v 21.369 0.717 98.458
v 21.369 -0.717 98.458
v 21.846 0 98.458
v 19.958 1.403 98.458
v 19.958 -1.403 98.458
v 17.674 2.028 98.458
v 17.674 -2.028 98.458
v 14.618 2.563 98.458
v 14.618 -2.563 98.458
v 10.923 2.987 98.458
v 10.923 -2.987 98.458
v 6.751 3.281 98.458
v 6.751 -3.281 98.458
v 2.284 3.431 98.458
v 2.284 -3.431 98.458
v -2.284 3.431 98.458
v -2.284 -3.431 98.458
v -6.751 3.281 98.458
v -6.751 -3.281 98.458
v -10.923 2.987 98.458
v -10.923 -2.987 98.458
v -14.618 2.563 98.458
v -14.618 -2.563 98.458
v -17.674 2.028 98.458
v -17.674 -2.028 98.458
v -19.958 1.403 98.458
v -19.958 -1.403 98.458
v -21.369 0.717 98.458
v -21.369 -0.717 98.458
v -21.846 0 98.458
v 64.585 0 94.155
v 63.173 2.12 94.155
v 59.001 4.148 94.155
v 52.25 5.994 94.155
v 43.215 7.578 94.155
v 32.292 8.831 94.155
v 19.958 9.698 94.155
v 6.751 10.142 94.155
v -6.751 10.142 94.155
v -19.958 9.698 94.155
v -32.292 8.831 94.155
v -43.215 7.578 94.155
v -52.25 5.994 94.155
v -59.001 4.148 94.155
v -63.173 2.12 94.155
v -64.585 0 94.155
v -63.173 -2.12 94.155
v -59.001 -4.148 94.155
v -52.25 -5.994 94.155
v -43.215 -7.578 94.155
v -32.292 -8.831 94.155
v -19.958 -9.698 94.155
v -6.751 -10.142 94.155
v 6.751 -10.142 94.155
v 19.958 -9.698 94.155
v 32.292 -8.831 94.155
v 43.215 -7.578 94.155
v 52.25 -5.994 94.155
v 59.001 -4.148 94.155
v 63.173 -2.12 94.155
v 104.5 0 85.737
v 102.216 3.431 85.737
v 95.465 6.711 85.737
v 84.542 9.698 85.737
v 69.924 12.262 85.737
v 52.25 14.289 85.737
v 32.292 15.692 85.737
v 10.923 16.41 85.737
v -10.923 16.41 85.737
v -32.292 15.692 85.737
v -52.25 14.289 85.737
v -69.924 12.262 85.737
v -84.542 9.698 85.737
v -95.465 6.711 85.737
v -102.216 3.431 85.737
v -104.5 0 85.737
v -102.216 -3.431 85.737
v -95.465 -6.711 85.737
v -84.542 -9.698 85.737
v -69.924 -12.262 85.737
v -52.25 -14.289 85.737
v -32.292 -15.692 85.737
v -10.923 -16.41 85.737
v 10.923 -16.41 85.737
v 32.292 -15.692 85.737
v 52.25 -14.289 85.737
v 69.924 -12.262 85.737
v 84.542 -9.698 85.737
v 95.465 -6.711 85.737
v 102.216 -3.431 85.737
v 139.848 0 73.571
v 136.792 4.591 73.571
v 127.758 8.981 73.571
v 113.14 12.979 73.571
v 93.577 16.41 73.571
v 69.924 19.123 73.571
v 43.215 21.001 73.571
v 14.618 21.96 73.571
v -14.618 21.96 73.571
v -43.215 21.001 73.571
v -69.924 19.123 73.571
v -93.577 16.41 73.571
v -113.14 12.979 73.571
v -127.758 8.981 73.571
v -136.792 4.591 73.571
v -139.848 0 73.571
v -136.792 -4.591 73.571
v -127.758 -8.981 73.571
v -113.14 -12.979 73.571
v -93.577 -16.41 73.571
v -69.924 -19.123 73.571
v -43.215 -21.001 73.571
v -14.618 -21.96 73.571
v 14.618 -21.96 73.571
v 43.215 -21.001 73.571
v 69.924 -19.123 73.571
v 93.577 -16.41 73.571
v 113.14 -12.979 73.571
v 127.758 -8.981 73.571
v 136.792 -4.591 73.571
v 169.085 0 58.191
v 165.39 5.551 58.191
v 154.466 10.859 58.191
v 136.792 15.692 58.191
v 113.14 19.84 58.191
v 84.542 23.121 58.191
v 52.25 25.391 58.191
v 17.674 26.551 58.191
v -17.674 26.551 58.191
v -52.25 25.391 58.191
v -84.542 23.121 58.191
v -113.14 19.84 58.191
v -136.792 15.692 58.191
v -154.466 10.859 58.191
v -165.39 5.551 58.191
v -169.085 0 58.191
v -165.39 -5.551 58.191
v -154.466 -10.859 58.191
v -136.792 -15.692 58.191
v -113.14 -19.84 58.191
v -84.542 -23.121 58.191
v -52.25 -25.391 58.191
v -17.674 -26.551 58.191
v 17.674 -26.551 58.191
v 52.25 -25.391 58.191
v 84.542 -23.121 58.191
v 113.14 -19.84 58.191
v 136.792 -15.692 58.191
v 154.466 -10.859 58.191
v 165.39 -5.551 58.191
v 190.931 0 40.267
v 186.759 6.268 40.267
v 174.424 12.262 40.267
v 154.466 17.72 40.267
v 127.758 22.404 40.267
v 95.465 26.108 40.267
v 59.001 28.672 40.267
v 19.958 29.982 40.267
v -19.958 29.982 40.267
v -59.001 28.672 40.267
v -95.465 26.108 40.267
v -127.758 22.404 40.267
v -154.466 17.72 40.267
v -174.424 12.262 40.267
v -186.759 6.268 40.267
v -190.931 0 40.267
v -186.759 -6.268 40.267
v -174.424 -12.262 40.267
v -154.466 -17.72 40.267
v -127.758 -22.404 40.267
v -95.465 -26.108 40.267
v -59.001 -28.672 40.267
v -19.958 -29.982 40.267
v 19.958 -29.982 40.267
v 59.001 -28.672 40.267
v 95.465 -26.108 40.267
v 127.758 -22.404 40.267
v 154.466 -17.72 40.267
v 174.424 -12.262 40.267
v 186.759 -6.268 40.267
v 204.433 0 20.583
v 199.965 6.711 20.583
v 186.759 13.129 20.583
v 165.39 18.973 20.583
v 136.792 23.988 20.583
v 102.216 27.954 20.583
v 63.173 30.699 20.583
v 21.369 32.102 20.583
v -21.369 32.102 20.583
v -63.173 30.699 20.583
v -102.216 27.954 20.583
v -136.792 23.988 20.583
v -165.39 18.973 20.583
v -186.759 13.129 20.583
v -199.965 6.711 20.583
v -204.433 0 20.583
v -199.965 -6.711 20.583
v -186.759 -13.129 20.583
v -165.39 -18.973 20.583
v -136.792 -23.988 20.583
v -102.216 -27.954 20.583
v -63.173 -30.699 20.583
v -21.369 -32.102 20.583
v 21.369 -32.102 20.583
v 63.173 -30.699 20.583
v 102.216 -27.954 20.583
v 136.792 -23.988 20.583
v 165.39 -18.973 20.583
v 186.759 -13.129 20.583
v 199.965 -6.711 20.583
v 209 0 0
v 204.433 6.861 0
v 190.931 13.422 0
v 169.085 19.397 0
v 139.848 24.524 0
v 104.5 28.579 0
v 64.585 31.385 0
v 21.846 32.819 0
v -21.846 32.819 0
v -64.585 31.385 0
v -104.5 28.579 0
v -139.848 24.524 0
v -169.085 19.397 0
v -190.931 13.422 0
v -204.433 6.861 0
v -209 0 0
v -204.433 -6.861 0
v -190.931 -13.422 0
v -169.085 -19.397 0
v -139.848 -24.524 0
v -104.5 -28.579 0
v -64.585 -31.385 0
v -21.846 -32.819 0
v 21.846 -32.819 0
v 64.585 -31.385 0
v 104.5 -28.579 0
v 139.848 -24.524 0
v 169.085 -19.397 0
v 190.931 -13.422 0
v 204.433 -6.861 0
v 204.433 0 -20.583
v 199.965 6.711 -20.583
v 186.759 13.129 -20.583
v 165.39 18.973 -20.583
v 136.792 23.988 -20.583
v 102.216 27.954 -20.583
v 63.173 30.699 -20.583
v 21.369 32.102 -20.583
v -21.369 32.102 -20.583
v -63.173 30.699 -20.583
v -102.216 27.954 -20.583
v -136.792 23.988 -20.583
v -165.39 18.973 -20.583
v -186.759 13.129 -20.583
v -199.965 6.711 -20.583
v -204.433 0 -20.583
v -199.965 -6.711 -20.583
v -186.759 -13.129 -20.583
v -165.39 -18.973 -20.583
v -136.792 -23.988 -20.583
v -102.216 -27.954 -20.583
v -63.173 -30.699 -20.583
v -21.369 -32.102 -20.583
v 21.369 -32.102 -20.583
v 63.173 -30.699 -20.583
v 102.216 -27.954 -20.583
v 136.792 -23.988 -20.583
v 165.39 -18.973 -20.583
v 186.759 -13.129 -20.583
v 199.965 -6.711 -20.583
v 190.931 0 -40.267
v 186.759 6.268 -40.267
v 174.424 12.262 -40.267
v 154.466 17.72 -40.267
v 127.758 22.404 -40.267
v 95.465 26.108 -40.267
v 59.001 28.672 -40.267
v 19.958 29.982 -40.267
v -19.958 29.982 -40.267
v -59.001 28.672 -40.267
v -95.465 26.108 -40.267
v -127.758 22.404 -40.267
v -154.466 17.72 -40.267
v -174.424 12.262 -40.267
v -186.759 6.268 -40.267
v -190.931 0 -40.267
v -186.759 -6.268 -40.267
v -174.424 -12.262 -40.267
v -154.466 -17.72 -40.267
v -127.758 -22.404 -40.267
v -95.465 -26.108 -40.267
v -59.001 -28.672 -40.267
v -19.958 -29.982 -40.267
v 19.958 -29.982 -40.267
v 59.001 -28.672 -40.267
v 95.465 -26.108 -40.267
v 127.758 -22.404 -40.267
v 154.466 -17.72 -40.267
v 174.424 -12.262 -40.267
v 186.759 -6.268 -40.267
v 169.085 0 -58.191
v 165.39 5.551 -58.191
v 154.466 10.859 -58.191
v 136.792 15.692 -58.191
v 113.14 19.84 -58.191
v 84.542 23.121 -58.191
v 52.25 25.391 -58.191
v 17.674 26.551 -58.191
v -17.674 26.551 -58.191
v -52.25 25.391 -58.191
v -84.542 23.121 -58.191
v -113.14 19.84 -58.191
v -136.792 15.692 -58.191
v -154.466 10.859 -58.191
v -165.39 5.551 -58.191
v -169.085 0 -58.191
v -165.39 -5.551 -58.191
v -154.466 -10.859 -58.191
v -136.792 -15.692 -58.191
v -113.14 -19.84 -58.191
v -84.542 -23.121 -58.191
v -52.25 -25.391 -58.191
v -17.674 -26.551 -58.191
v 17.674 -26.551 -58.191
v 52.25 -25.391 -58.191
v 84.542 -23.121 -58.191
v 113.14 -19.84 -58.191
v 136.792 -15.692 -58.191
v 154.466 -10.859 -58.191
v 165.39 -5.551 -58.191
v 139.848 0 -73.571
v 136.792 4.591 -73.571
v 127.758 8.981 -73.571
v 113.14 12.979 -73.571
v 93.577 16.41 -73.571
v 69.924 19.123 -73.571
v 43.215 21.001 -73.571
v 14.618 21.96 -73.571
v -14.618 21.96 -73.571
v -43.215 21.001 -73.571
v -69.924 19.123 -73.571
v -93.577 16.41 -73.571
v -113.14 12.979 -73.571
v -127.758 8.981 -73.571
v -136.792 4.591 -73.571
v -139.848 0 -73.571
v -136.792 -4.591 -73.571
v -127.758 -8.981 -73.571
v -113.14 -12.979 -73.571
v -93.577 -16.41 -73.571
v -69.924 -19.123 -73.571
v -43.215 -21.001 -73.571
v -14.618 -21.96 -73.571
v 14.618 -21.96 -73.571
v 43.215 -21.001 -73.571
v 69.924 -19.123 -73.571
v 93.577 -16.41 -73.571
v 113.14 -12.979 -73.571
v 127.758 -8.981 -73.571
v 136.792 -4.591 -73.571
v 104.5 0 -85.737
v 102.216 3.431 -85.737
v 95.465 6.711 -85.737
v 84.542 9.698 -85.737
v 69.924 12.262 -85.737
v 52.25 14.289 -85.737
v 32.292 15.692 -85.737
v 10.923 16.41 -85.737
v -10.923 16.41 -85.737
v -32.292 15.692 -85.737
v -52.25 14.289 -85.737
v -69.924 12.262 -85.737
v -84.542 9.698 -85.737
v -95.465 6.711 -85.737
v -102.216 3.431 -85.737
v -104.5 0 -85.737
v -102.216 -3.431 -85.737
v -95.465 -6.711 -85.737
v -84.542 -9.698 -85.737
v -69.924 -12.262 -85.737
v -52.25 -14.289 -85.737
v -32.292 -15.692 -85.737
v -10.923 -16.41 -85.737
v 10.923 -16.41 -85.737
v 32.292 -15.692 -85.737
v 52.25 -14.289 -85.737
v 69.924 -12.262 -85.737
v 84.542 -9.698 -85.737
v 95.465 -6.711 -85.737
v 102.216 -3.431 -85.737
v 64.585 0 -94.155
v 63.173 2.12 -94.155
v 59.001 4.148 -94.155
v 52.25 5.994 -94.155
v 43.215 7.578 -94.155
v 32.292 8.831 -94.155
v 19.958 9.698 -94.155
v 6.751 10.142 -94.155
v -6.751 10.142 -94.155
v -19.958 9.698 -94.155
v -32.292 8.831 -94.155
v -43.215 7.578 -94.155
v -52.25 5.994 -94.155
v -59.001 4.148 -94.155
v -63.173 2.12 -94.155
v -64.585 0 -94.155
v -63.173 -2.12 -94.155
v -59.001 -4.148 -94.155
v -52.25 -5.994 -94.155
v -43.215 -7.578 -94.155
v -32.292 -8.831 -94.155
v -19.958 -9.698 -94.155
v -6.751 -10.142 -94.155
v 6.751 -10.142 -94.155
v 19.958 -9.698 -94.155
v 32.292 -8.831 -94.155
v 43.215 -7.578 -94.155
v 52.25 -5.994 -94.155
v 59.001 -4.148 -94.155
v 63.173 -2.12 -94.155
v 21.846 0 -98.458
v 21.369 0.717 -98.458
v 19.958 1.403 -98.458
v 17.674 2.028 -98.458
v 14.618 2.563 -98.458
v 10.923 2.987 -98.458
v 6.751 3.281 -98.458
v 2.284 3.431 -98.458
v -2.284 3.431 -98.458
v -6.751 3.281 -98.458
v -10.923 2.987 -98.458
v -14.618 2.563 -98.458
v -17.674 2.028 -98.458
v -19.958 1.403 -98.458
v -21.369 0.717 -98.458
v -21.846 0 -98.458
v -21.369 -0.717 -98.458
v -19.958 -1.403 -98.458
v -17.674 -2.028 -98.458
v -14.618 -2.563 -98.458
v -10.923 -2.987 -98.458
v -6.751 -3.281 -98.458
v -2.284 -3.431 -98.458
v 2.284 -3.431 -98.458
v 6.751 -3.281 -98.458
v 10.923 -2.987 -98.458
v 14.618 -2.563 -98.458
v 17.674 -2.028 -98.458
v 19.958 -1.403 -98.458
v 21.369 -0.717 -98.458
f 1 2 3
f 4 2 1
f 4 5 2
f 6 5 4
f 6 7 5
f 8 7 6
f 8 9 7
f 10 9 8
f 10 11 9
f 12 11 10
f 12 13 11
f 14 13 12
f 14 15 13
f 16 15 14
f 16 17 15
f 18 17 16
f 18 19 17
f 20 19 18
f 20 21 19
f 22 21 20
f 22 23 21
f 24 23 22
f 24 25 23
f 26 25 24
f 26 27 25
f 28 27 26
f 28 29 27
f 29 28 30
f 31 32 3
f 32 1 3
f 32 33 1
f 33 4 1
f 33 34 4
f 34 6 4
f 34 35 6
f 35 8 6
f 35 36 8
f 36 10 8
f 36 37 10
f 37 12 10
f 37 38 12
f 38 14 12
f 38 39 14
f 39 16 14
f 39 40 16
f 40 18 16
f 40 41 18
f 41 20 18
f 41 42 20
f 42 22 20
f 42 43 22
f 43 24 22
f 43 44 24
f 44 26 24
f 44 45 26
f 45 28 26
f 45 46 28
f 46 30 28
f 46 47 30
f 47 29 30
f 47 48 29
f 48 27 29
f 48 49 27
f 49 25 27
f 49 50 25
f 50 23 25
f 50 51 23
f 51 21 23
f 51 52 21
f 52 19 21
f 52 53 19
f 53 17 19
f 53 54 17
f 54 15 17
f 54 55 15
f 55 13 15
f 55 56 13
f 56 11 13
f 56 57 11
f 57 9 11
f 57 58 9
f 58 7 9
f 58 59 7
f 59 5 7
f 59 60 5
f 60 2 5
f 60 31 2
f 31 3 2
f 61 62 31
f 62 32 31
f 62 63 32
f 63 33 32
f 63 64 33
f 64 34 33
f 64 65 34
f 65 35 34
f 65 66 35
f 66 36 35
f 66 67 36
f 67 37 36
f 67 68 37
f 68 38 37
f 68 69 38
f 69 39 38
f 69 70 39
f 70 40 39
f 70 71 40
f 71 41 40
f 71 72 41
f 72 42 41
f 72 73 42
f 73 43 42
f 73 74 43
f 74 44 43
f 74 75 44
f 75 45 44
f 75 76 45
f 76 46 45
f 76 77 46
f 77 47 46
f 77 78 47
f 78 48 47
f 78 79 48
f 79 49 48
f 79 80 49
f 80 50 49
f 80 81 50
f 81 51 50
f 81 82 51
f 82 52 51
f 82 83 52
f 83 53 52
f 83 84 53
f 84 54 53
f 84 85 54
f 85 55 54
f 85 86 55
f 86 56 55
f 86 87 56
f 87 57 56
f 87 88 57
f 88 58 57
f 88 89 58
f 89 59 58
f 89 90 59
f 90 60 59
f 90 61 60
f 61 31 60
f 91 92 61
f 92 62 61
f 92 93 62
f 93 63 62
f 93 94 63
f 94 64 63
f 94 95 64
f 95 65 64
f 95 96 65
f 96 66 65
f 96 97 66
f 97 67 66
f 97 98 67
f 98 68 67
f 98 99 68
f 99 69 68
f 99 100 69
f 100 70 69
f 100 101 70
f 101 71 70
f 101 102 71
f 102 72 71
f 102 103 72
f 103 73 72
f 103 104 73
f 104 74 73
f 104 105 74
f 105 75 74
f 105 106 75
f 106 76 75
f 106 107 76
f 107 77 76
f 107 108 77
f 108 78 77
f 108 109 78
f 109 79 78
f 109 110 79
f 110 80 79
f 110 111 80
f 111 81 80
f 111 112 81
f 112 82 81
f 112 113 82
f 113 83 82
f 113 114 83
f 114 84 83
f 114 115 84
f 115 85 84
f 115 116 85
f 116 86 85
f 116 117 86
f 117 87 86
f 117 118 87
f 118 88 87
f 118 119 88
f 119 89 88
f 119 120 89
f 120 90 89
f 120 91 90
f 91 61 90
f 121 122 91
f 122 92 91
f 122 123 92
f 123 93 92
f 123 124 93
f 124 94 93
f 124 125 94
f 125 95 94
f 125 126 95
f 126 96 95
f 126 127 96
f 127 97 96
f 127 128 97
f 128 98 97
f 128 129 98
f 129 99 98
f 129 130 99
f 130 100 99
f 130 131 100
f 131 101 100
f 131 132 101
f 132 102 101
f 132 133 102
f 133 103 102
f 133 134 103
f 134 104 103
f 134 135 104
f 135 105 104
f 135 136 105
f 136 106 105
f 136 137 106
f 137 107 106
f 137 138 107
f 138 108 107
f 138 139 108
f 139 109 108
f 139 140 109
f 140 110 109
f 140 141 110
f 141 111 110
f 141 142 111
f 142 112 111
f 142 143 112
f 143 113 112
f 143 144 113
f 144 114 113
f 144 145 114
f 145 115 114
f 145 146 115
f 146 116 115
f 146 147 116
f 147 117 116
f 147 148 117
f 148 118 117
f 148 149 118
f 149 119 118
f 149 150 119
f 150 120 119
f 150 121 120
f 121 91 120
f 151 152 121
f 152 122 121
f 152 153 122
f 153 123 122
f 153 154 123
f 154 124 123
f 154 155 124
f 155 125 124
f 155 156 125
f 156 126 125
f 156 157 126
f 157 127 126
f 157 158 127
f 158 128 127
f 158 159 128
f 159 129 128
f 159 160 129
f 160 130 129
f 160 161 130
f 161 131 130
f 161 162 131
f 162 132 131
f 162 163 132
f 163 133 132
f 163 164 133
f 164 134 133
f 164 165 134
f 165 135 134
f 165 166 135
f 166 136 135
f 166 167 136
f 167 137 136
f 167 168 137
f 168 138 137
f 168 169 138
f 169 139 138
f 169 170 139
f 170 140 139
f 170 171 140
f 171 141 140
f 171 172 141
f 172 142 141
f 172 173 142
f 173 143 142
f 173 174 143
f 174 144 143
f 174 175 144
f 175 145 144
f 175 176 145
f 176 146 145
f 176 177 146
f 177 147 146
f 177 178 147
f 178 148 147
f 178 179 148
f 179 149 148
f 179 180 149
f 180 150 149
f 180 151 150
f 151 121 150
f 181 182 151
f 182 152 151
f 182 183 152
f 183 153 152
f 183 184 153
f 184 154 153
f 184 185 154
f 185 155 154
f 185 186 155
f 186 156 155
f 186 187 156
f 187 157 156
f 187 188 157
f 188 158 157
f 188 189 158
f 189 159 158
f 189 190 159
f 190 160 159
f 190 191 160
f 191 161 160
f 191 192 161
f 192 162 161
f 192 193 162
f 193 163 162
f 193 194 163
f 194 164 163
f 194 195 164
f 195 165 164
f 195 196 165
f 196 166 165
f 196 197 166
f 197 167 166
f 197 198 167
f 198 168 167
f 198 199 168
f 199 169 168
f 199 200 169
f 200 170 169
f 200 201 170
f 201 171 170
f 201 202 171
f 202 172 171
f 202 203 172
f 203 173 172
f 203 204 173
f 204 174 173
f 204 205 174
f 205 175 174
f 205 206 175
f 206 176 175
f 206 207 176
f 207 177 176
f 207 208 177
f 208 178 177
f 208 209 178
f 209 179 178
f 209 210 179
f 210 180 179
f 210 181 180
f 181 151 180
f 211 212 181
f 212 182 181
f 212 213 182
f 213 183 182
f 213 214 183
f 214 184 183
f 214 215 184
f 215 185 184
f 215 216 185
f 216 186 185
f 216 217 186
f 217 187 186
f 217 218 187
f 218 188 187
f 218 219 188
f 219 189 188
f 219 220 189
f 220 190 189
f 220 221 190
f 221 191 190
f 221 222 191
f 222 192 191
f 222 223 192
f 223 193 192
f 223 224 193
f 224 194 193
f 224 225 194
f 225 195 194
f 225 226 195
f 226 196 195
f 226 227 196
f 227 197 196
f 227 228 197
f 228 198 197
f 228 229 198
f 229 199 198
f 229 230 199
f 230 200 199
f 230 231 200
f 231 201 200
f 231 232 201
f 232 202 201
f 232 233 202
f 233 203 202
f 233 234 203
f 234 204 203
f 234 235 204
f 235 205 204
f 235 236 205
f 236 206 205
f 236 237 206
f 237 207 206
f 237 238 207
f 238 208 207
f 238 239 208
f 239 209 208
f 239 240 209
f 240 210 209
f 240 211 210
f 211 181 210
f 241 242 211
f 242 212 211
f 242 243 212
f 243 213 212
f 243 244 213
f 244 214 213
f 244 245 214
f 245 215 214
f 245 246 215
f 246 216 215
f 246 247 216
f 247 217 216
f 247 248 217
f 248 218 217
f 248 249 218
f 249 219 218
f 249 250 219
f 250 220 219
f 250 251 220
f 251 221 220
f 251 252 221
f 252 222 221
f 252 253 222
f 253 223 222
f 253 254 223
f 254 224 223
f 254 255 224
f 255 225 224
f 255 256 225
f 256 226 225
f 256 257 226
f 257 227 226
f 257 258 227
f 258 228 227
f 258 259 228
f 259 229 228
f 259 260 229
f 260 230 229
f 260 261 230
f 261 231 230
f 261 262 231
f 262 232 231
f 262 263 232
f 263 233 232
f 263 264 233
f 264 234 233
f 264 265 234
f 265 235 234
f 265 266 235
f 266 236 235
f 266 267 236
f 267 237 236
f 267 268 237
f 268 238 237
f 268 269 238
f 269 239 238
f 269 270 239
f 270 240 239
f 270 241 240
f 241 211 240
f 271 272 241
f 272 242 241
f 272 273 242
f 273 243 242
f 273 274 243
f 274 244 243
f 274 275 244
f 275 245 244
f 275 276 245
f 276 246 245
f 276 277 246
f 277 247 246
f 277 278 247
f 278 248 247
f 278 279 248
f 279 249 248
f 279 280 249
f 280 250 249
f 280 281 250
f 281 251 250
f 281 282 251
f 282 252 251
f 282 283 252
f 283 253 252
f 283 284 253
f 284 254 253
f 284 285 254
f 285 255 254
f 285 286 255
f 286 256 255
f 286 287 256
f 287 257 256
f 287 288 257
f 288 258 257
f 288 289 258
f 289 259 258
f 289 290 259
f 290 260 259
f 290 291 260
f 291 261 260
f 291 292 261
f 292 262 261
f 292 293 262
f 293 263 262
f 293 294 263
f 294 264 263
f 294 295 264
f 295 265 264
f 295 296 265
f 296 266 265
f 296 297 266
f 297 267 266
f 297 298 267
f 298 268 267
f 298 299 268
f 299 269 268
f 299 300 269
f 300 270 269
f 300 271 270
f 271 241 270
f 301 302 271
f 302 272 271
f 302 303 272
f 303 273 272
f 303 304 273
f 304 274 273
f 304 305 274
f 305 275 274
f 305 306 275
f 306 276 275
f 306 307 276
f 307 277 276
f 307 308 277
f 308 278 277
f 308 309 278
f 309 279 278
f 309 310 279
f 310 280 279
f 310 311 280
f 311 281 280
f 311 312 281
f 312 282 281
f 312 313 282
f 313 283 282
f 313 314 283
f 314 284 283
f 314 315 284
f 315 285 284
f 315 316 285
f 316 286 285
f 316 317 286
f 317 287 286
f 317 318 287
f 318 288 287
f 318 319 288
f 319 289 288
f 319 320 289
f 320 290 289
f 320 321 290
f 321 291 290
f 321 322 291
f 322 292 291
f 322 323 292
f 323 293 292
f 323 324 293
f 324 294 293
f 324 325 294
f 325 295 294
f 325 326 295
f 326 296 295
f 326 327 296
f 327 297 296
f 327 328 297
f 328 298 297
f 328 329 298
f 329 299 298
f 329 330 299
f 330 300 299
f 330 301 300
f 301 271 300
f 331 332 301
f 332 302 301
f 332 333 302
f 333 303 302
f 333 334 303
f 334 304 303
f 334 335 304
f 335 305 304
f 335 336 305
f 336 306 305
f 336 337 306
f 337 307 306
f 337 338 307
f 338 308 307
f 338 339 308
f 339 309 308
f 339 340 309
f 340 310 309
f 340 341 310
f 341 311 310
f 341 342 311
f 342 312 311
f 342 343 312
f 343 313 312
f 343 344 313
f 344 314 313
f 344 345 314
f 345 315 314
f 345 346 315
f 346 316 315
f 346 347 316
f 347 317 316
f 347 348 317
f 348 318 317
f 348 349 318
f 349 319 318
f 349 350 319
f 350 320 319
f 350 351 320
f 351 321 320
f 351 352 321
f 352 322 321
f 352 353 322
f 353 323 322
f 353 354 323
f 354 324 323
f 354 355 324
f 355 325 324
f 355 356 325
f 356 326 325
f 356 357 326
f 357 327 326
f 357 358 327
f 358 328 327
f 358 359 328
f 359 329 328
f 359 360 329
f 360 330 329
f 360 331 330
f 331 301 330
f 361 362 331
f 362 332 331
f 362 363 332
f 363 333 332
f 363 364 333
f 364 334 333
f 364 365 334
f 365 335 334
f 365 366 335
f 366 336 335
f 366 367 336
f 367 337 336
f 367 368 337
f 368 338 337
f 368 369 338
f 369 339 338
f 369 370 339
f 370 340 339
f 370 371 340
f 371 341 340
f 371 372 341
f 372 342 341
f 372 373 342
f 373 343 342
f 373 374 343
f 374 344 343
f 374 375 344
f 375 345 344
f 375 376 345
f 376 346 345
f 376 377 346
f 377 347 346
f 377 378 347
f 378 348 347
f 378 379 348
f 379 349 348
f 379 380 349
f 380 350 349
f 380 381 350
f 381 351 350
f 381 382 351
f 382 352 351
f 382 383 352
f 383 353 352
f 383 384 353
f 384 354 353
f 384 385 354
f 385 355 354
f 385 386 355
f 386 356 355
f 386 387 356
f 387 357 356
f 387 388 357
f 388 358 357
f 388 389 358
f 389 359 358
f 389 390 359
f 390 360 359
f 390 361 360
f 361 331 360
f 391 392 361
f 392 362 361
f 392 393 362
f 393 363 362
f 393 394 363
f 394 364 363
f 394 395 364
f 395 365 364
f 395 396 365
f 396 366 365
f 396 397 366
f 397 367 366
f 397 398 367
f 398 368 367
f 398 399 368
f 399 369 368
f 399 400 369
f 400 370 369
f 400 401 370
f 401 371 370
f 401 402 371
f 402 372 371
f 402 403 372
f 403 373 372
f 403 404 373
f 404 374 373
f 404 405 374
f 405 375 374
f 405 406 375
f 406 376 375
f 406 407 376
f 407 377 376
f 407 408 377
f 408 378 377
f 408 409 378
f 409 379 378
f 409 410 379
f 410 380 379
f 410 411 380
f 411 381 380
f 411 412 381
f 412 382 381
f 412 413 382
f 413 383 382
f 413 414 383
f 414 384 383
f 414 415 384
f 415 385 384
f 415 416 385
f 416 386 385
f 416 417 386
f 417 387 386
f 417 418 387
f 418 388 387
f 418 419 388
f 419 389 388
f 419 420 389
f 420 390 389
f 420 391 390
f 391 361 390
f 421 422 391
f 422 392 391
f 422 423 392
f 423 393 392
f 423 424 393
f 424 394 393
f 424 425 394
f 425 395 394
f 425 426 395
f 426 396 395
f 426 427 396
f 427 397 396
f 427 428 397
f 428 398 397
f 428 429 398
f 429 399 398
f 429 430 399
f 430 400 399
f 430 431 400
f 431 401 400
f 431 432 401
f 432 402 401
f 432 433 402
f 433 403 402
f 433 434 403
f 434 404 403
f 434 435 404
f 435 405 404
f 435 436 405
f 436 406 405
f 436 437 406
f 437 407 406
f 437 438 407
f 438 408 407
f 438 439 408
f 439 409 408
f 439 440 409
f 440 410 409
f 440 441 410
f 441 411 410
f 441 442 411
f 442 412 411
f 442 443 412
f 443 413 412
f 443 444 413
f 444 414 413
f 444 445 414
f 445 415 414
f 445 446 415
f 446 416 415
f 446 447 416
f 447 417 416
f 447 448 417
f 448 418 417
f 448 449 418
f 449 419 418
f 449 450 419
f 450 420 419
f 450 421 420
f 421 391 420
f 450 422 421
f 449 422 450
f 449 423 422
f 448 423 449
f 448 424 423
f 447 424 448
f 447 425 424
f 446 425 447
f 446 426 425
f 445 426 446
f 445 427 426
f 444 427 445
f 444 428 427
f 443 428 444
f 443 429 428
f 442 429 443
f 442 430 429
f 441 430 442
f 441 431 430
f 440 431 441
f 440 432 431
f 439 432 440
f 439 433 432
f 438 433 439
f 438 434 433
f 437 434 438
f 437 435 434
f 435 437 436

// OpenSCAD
// Generated by SolidPython 1.0.1 on 2020-07-29 00:46:53


scale(v = [19, 3, 9]) {
	sphere(r = 11);
}
/***********************************************
*********      SolidPython code:      **********
************************************************
 
# import packages: SolidPython
from solid import *
from solid.utils import *
from itertools import chain, combinations, permutations


class Resize:

    def __init__(self, scad_file):
        self.scad_file = scad_file
        #self.scad_file = import_scad(scad_file)
        # cone/cylinder param:
        self.r1 = 0
        self.r2 = 0
        self.h = 0
        # rectangular prism param:
        self.w = 0
        self.l = 0
        # ellipse param:
        self.r = 0

    # import OpenScad code (file name corresponds to shape)


    # classify shape + parameters
    def assign(self, param1, param2, param3):
        if self.scad_file == 'cone.scad':
            self.r1 = param1
            self.r2 = param2
            self.h = param3
        elif self.scad_file == 'cylinder.scad':
            self.r1 = param1
            self.r2 = param2
            self.h = param3
        elif self.scad_file == 'rectangularPrism.scad':
            self.h = param1
            self.l = param2
            self.w = param3
        else:
            self.r = param1
            self.h = param2

    # resize parameters
    def iterate(self):
        x = range(3, 20, 2)
        i = 1
        if self.scad_file == 'cone.scad':
            tempList = list(permutations(x, 2))
            for temp in tempList:
                param1 = temp[0]
                param2 = temp[1]
                filepath = 'produced_scad_files/' + 'cone' + str(param1) + '_' + str(param2) + '_' + '.scad'
                scad_render_to_file(cylinder(h=param1, r1=param2, r2=0), filepath)

        elif self.scad_file == 'cylinder.scad':
            tempList = list(permutations(x, 3))
            for temp in tempList:
                param1 = temp[0]
                param2 = temp[1]
                filepath = 'produced_scad_files/' + 'cylinder' + str(param1) + '_' + str(param2) + '_' + '.scad'
                scad_render_to_file(cylinder(h=param1, r1=param2, r2=param2), filepath)

        elif self.scad_file == 'rectangularPrism.scad':
            tempList = list(permutations(x, 3))
            for temp in tempList:
                param1 = temp[0]
                param2 = temp[1]
                param3 = temp[2]
                filepath = 'produced_scad_files/' + 'rectangularPrism' + str(param1) + '_' + str(param2) + '_' + str(
                    param3) + '.scad'
                scad_render_to_file(cube(size=(param1, param2, param3)), filepath)

        elif self.scad_file == 'ellipse.scad':
            tempList = list(permutations(x, 4))
            for temp in tempList:
                param1 = temp[0]
                param2 = temp[1]
                param3 = temp[2]
                param4 = temp[3]
                filepath = 'produced_scad_files/' + 'ellipse' + str(param1) + '_' + str(param2) + '_' + str(param3) + '_' + str(param4) + '.scad'
                scad_render_to_file(scale([param1, param2, param3])(sphere(r=param4)), filepath)

    def render_to_scadfile(self):
        scad_render_to_file(scad, 'example.scad') 
 
************************************************/
